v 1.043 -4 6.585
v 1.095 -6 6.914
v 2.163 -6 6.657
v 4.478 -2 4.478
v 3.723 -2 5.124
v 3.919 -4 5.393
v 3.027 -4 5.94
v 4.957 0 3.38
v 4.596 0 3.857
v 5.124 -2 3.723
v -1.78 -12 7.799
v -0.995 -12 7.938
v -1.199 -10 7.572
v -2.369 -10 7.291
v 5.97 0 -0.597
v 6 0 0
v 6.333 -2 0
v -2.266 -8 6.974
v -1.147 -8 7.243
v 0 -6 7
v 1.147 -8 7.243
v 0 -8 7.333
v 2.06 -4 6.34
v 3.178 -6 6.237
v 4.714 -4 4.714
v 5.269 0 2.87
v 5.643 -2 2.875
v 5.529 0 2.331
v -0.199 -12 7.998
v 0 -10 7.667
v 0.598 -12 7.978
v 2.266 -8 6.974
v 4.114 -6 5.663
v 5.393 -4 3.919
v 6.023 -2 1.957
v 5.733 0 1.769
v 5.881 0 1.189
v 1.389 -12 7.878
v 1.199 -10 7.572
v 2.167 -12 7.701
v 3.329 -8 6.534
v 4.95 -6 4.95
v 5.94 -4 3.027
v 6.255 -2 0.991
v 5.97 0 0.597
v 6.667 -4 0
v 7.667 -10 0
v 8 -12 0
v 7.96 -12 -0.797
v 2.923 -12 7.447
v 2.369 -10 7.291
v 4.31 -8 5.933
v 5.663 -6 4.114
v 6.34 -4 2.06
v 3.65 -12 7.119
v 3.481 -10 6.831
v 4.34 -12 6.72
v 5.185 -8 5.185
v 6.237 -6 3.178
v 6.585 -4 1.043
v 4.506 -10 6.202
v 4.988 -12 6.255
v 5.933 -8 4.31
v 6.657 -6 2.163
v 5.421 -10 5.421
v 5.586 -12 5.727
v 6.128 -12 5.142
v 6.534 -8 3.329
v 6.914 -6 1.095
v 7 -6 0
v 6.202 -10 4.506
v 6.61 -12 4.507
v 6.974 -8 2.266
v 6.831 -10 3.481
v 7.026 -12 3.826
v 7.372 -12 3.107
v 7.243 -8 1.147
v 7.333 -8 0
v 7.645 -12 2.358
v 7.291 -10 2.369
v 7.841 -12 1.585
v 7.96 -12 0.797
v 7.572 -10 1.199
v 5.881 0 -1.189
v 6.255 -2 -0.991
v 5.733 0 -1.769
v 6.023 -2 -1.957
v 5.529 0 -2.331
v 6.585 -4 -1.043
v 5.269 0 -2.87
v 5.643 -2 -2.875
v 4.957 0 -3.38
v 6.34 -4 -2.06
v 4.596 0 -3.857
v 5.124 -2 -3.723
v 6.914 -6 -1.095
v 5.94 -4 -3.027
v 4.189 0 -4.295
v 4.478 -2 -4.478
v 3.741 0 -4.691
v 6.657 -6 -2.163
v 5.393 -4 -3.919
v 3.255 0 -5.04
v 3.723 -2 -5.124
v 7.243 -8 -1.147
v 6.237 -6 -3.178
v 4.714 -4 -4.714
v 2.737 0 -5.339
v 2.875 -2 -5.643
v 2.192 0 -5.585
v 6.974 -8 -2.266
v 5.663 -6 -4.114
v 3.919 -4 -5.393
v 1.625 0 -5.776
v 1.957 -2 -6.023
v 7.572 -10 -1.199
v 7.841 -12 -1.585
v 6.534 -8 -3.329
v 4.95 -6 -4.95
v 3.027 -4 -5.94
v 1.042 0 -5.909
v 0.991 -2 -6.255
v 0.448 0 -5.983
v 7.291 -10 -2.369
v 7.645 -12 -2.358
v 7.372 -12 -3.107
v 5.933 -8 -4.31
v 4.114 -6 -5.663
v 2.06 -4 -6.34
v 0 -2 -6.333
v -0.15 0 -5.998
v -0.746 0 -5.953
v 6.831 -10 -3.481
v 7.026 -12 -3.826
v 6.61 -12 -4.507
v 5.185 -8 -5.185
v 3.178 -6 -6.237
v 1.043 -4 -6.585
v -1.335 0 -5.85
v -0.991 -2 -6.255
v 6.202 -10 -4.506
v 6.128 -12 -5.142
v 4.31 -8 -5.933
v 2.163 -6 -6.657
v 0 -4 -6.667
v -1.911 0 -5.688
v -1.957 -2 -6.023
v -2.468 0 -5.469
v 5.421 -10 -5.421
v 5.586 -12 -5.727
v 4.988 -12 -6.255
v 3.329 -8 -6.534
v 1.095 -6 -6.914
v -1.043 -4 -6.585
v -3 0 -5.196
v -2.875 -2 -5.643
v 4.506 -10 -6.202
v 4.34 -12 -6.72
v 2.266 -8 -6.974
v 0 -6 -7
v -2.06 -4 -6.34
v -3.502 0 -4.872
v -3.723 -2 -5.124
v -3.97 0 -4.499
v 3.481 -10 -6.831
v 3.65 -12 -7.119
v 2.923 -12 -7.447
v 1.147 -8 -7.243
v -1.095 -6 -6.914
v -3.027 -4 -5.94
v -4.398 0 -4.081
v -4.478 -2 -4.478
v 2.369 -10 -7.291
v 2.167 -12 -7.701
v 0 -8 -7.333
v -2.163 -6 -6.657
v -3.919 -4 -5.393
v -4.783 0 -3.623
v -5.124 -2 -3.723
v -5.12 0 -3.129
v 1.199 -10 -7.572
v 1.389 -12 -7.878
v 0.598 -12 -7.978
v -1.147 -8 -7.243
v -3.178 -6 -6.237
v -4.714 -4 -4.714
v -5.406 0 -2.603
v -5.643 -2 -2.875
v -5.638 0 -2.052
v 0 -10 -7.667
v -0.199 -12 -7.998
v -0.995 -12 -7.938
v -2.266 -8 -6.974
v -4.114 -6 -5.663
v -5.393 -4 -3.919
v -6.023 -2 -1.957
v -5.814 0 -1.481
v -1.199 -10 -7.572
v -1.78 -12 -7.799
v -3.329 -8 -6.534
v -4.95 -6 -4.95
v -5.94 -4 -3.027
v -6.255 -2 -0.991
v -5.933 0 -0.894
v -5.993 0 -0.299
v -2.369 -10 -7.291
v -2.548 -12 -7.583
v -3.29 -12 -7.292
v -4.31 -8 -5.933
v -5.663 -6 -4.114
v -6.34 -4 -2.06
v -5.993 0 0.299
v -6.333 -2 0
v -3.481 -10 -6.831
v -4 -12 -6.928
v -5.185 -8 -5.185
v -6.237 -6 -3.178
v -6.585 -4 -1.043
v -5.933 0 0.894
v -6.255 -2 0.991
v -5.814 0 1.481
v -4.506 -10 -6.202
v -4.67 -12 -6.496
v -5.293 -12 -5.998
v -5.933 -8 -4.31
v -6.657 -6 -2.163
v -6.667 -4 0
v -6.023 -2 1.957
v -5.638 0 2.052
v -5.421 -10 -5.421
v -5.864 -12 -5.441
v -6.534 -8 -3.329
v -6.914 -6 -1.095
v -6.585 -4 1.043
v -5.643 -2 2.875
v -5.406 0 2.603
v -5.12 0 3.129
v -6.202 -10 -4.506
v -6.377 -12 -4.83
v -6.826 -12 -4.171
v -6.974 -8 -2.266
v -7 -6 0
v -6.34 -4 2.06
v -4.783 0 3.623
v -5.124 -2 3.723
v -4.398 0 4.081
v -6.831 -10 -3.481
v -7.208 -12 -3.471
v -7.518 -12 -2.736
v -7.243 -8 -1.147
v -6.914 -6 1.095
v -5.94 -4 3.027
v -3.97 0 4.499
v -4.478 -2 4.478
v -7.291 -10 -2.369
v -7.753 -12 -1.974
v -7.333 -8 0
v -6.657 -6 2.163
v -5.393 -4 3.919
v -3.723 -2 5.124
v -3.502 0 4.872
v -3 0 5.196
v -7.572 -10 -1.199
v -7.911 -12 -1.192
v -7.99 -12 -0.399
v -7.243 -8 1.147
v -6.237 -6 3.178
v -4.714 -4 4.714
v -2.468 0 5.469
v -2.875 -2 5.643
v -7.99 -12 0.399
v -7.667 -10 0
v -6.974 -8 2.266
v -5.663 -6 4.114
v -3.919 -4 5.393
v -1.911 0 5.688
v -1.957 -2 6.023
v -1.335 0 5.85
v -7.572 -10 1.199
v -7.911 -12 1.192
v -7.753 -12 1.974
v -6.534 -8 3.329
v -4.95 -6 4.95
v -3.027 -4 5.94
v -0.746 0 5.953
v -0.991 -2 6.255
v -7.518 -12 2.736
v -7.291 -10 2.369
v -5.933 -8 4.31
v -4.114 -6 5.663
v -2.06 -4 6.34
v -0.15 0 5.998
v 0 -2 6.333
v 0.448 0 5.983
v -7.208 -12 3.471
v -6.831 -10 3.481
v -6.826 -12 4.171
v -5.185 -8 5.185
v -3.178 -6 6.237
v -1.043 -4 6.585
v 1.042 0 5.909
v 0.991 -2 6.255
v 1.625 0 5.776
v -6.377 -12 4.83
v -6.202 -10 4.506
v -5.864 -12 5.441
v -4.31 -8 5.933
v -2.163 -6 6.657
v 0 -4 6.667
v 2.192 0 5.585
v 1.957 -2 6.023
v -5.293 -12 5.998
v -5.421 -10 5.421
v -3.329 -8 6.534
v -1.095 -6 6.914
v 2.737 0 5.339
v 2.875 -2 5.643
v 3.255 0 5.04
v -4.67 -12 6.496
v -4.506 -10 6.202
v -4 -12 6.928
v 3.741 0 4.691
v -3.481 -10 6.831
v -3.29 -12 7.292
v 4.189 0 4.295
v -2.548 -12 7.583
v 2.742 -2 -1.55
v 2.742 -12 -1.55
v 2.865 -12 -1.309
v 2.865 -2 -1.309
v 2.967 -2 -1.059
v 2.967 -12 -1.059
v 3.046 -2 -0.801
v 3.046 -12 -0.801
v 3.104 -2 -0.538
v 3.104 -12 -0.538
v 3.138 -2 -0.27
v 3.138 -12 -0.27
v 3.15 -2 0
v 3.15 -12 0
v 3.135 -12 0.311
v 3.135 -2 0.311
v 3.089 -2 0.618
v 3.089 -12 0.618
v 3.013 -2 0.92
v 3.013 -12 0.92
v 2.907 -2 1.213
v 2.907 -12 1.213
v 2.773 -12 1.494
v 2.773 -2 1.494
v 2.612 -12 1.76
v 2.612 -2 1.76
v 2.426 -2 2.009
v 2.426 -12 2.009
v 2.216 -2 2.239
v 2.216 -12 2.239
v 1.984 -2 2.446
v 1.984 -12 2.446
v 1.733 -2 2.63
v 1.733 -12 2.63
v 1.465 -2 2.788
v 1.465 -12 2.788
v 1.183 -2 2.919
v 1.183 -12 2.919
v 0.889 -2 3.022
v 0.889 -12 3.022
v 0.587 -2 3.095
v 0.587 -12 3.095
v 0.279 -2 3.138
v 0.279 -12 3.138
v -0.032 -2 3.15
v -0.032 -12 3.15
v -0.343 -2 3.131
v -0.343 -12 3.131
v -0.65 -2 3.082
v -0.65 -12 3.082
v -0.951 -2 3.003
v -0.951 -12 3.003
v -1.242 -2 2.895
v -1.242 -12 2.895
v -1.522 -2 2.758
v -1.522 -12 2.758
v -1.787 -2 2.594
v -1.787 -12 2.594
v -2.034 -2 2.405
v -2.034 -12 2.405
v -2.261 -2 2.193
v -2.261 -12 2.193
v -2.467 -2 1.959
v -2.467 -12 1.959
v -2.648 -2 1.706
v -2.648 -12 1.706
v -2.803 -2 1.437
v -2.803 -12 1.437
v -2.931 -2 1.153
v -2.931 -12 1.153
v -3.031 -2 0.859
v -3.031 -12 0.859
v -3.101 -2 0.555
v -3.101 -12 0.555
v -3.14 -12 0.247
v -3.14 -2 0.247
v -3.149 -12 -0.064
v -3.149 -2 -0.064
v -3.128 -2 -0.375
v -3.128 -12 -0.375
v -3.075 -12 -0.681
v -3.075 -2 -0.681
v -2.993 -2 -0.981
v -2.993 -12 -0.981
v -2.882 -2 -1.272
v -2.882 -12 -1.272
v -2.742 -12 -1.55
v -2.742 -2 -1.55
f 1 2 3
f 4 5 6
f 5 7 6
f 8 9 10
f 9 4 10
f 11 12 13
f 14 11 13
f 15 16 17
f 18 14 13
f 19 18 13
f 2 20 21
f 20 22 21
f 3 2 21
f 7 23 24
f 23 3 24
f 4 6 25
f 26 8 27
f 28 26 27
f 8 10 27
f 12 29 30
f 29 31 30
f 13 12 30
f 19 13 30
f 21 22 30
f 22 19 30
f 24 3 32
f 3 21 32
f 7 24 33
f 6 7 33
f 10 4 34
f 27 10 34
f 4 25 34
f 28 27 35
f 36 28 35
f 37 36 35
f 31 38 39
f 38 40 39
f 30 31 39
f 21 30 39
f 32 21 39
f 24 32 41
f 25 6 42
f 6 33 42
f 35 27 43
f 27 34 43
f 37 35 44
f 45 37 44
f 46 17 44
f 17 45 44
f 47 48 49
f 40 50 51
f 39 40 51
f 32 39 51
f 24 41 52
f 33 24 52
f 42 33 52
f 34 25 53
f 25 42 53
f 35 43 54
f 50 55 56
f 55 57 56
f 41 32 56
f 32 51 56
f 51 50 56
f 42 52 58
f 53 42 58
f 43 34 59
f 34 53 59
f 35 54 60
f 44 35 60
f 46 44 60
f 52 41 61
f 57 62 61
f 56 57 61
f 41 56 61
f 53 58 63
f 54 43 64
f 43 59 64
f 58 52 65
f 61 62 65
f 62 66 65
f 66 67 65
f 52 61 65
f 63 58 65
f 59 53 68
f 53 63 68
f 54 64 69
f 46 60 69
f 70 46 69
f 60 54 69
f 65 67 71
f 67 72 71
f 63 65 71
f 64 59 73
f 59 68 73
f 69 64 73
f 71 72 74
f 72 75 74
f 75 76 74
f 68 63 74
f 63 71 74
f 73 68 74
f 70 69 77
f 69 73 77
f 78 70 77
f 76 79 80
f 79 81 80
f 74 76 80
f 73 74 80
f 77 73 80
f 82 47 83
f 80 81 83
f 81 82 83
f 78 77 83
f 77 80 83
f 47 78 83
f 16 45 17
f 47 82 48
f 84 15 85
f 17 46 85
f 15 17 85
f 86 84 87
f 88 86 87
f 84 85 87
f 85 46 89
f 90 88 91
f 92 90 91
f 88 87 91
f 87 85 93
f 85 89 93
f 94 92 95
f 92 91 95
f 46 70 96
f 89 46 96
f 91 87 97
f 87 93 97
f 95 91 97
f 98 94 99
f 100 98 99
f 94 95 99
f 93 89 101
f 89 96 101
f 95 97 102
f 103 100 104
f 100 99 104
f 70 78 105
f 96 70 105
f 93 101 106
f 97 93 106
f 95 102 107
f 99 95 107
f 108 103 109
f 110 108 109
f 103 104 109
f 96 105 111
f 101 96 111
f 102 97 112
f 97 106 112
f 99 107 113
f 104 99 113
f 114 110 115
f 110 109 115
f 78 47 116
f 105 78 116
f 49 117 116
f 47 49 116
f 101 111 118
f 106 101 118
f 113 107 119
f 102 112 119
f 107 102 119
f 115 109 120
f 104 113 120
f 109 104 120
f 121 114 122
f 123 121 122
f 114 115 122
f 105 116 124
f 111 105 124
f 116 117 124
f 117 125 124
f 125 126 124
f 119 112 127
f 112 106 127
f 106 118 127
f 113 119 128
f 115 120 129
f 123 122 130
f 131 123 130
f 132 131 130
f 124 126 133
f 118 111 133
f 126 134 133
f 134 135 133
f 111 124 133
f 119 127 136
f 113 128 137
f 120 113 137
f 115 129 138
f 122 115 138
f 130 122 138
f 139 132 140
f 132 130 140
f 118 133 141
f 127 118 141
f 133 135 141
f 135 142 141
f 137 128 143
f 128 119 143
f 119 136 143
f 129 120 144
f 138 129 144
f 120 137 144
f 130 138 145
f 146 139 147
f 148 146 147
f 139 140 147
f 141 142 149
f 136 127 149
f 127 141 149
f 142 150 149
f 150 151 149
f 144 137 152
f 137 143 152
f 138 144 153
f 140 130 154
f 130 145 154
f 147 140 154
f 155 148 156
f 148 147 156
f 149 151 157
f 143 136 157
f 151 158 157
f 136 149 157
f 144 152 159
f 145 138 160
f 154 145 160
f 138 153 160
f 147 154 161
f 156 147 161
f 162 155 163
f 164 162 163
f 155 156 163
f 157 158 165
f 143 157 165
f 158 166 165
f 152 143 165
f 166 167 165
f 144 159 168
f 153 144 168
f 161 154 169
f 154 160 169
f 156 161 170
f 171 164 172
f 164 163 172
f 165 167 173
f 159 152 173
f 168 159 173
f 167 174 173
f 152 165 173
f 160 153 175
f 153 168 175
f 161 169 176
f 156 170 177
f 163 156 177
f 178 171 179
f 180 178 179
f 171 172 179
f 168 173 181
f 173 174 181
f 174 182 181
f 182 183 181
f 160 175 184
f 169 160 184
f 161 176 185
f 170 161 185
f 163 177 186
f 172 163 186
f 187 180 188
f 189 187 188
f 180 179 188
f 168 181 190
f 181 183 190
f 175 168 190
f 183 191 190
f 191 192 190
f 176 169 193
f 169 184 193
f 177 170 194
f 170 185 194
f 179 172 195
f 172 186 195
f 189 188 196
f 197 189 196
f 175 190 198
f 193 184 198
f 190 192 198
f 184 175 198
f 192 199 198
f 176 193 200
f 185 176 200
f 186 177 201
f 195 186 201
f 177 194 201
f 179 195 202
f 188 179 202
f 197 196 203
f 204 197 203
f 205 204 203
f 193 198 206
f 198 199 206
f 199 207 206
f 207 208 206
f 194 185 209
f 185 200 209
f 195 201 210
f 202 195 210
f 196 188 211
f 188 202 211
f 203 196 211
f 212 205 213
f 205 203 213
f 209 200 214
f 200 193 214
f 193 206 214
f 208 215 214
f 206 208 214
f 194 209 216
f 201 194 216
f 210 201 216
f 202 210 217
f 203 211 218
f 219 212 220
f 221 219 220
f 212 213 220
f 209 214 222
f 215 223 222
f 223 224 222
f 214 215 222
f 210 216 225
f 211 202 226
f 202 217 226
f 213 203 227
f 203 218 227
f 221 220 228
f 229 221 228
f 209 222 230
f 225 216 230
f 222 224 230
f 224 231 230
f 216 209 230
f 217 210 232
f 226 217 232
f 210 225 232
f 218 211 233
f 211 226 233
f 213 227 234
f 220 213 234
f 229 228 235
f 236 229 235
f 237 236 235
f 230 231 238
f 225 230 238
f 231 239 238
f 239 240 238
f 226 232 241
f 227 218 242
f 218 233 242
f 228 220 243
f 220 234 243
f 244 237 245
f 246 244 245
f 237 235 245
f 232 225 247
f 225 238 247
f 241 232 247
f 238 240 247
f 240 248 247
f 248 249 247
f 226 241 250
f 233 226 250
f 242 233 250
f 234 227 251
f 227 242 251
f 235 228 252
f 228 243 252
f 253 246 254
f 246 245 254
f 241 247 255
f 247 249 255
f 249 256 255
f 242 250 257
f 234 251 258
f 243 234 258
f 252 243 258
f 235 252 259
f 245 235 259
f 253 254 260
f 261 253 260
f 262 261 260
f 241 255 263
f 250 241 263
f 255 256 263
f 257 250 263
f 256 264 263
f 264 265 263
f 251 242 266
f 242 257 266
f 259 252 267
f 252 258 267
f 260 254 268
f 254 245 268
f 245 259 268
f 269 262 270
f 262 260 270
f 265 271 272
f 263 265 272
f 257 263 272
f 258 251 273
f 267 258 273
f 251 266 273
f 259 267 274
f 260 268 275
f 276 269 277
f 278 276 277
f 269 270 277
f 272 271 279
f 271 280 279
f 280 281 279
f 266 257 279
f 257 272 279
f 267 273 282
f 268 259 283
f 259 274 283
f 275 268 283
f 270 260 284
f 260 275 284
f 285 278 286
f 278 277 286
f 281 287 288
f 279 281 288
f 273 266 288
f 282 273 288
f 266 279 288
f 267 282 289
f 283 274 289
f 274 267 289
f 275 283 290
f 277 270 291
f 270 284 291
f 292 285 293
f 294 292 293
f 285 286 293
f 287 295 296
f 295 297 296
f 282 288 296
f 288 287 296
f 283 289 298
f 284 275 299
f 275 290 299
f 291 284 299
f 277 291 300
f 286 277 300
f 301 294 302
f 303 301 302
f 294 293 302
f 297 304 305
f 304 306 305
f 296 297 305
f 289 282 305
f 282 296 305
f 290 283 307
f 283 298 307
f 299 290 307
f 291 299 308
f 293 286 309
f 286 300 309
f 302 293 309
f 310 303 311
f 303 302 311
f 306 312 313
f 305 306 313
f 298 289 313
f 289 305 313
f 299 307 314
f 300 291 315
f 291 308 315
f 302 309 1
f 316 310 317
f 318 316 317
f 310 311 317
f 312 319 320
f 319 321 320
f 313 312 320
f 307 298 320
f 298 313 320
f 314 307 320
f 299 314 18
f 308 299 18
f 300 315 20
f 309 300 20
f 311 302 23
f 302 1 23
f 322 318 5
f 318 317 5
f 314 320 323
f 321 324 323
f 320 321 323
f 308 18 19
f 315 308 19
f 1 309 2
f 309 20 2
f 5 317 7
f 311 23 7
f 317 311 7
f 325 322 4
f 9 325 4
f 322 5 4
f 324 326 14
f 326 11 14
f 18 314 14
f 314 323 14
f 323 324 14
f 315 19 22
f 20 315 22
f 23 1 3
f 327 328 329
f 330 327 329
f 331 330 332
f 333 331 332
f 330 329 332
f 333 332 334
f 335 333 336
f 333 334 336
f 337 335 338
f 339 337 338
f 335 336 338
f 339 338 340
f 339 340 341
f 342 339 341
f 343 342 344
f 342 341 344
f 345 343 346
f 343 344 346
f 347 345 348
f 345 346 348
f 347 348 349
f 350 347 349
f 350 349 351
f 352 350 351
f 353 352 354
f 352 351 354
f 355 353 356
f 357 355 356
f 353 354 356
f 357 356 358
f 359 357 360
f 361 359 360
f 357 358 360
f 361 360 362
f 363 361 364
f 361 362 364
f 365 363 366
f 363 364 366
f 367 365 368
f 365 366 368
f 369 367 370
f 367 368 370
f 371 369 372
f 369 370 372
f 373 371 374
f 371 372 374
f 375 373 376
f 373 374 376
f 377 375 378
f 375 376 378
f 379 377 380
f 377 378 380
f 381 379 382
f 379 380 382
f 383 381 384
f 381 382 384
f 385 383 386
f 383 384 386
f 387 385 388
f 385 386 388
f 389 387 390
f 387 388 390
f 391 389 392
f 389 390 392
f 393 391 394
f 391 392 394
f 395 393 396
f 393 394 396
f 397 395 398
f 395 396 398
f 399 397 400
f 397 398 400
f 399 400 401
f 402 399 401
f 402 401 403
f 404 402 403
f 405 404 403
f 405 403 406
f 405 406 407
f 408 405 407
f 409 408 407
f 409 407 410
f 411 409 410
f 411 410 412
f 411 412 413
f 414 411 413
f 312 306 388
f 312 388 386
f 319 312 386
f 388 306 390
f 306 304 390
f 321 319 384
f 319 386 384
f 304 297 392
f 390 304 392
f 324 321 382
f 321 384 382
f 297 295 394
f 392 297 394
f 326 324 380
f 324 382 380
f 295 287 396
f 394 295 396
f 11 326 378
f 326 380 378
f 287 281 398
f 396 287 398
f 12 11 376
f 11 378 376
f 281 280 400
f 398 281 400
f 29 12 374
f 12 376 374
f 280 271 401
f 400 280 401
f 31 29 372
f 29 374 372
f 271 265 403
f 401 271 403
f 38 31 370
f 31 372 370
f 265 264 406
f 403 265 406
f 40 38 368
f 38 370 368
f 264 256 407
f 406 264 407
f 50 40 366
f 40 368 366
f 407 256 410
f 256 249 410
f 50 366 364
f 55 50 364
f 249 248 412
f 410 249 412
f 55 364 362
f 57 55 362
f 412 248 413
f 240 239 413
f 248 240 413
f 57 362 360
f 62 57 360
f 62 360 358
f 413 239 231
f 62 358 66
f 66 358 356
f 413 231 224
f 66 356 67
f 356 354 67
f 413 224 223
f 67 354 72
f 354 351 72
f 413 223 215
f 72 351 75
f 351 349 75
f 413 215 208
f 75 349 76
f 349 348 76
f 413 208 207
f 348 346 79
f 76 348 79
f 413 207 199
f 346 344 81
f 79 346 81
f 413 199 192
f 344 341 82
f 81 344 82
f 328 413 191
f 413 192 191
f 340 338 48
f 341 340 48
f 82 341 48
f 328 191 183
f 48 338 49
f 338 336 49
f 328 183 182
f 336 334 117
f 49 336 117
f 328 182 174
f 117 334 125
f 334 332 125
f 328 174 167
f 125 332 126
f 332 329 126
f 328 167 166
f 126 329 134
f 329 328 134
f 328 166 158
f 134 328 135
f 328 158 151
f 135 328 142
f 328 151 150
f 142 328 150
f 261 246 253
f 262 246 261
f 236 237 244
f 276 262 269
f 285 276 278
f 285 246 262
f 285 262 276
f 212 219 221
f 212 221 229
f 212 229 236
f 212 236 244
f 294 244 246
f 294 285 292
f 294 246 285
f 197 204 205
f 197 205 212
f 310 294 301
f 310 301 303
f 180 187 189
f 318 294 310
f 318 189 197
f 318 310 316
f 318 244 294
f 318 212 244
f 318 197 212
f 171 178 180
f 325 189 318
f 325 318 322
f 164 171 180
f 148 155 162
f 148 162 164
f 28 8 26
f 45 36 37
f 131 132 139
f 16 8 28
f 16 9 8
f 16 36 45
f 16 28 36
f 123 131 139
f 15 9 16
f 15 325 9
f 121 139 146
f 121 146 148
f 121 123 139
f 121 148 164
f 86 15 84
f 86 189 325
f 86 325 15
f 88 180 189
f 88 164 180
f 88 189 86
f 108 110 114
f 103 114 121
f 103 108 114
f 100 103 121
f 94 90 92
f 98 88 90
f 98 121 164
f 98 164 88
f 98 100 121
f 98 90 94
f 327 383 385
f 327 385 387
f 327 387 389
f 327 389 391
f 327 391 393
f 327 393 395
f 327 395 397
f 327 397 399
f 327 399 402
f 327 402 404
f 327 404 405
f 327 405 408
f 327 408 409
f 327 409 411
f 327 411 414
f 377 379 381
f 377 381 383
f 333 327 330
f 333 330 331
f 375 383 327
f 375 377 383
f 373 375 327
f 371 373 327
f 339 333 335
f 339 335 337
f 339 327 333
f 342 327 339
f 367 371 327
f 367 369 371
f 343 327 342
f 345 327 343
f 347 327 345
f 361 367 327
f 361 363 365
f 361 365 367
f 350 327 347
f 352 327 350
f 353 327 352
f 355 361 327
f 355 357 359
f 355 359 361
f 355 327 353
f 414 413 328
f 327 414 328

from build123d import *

# Parameters (mm, degrees)
SKETCH1_R          = 6
SKETCH2_R          = 8
CUT_EXTRUDE1_DEPTH = 10


with BuildPart() as part:
    # Sketch1 → Loft1 section 0
    with BuildSketch(Plane(origin=(0, 0, 0), x_dir=(1, 0, 0), z_dir=(0, 1, 0))):
        Circle(SKETCH1_R)
    # Sketch2 → Loft1 section 1
    with BuildSketch(Plane(origin=(0, -12, 0), x_dir=(1, 0, 0), z_dir=(0, 1, 0))):
        Circle(SKETCH2_R)
    loft()

    # Sketch4 → Cut-Extrude1 (cut)
    with BuildSketch(Plane.XZ.offset(12)):
        with BuildLine():
            ThreePointArc((3.15, 0), (-0.801366085, 3.046360517), (-2.74226184, -1.55))
            Line((-2.74226184, -1.55), (2.74226184, -1.55))
            ThreePointArc((2.74226184, -1.55), (3.046360517, -0.801366085), (3.15, 0))
        make_face()
    extrude(amount=-CUT_EXTRUDE1_DEPTH, mode=Mode.SUBTRACT)


solid = part.part
